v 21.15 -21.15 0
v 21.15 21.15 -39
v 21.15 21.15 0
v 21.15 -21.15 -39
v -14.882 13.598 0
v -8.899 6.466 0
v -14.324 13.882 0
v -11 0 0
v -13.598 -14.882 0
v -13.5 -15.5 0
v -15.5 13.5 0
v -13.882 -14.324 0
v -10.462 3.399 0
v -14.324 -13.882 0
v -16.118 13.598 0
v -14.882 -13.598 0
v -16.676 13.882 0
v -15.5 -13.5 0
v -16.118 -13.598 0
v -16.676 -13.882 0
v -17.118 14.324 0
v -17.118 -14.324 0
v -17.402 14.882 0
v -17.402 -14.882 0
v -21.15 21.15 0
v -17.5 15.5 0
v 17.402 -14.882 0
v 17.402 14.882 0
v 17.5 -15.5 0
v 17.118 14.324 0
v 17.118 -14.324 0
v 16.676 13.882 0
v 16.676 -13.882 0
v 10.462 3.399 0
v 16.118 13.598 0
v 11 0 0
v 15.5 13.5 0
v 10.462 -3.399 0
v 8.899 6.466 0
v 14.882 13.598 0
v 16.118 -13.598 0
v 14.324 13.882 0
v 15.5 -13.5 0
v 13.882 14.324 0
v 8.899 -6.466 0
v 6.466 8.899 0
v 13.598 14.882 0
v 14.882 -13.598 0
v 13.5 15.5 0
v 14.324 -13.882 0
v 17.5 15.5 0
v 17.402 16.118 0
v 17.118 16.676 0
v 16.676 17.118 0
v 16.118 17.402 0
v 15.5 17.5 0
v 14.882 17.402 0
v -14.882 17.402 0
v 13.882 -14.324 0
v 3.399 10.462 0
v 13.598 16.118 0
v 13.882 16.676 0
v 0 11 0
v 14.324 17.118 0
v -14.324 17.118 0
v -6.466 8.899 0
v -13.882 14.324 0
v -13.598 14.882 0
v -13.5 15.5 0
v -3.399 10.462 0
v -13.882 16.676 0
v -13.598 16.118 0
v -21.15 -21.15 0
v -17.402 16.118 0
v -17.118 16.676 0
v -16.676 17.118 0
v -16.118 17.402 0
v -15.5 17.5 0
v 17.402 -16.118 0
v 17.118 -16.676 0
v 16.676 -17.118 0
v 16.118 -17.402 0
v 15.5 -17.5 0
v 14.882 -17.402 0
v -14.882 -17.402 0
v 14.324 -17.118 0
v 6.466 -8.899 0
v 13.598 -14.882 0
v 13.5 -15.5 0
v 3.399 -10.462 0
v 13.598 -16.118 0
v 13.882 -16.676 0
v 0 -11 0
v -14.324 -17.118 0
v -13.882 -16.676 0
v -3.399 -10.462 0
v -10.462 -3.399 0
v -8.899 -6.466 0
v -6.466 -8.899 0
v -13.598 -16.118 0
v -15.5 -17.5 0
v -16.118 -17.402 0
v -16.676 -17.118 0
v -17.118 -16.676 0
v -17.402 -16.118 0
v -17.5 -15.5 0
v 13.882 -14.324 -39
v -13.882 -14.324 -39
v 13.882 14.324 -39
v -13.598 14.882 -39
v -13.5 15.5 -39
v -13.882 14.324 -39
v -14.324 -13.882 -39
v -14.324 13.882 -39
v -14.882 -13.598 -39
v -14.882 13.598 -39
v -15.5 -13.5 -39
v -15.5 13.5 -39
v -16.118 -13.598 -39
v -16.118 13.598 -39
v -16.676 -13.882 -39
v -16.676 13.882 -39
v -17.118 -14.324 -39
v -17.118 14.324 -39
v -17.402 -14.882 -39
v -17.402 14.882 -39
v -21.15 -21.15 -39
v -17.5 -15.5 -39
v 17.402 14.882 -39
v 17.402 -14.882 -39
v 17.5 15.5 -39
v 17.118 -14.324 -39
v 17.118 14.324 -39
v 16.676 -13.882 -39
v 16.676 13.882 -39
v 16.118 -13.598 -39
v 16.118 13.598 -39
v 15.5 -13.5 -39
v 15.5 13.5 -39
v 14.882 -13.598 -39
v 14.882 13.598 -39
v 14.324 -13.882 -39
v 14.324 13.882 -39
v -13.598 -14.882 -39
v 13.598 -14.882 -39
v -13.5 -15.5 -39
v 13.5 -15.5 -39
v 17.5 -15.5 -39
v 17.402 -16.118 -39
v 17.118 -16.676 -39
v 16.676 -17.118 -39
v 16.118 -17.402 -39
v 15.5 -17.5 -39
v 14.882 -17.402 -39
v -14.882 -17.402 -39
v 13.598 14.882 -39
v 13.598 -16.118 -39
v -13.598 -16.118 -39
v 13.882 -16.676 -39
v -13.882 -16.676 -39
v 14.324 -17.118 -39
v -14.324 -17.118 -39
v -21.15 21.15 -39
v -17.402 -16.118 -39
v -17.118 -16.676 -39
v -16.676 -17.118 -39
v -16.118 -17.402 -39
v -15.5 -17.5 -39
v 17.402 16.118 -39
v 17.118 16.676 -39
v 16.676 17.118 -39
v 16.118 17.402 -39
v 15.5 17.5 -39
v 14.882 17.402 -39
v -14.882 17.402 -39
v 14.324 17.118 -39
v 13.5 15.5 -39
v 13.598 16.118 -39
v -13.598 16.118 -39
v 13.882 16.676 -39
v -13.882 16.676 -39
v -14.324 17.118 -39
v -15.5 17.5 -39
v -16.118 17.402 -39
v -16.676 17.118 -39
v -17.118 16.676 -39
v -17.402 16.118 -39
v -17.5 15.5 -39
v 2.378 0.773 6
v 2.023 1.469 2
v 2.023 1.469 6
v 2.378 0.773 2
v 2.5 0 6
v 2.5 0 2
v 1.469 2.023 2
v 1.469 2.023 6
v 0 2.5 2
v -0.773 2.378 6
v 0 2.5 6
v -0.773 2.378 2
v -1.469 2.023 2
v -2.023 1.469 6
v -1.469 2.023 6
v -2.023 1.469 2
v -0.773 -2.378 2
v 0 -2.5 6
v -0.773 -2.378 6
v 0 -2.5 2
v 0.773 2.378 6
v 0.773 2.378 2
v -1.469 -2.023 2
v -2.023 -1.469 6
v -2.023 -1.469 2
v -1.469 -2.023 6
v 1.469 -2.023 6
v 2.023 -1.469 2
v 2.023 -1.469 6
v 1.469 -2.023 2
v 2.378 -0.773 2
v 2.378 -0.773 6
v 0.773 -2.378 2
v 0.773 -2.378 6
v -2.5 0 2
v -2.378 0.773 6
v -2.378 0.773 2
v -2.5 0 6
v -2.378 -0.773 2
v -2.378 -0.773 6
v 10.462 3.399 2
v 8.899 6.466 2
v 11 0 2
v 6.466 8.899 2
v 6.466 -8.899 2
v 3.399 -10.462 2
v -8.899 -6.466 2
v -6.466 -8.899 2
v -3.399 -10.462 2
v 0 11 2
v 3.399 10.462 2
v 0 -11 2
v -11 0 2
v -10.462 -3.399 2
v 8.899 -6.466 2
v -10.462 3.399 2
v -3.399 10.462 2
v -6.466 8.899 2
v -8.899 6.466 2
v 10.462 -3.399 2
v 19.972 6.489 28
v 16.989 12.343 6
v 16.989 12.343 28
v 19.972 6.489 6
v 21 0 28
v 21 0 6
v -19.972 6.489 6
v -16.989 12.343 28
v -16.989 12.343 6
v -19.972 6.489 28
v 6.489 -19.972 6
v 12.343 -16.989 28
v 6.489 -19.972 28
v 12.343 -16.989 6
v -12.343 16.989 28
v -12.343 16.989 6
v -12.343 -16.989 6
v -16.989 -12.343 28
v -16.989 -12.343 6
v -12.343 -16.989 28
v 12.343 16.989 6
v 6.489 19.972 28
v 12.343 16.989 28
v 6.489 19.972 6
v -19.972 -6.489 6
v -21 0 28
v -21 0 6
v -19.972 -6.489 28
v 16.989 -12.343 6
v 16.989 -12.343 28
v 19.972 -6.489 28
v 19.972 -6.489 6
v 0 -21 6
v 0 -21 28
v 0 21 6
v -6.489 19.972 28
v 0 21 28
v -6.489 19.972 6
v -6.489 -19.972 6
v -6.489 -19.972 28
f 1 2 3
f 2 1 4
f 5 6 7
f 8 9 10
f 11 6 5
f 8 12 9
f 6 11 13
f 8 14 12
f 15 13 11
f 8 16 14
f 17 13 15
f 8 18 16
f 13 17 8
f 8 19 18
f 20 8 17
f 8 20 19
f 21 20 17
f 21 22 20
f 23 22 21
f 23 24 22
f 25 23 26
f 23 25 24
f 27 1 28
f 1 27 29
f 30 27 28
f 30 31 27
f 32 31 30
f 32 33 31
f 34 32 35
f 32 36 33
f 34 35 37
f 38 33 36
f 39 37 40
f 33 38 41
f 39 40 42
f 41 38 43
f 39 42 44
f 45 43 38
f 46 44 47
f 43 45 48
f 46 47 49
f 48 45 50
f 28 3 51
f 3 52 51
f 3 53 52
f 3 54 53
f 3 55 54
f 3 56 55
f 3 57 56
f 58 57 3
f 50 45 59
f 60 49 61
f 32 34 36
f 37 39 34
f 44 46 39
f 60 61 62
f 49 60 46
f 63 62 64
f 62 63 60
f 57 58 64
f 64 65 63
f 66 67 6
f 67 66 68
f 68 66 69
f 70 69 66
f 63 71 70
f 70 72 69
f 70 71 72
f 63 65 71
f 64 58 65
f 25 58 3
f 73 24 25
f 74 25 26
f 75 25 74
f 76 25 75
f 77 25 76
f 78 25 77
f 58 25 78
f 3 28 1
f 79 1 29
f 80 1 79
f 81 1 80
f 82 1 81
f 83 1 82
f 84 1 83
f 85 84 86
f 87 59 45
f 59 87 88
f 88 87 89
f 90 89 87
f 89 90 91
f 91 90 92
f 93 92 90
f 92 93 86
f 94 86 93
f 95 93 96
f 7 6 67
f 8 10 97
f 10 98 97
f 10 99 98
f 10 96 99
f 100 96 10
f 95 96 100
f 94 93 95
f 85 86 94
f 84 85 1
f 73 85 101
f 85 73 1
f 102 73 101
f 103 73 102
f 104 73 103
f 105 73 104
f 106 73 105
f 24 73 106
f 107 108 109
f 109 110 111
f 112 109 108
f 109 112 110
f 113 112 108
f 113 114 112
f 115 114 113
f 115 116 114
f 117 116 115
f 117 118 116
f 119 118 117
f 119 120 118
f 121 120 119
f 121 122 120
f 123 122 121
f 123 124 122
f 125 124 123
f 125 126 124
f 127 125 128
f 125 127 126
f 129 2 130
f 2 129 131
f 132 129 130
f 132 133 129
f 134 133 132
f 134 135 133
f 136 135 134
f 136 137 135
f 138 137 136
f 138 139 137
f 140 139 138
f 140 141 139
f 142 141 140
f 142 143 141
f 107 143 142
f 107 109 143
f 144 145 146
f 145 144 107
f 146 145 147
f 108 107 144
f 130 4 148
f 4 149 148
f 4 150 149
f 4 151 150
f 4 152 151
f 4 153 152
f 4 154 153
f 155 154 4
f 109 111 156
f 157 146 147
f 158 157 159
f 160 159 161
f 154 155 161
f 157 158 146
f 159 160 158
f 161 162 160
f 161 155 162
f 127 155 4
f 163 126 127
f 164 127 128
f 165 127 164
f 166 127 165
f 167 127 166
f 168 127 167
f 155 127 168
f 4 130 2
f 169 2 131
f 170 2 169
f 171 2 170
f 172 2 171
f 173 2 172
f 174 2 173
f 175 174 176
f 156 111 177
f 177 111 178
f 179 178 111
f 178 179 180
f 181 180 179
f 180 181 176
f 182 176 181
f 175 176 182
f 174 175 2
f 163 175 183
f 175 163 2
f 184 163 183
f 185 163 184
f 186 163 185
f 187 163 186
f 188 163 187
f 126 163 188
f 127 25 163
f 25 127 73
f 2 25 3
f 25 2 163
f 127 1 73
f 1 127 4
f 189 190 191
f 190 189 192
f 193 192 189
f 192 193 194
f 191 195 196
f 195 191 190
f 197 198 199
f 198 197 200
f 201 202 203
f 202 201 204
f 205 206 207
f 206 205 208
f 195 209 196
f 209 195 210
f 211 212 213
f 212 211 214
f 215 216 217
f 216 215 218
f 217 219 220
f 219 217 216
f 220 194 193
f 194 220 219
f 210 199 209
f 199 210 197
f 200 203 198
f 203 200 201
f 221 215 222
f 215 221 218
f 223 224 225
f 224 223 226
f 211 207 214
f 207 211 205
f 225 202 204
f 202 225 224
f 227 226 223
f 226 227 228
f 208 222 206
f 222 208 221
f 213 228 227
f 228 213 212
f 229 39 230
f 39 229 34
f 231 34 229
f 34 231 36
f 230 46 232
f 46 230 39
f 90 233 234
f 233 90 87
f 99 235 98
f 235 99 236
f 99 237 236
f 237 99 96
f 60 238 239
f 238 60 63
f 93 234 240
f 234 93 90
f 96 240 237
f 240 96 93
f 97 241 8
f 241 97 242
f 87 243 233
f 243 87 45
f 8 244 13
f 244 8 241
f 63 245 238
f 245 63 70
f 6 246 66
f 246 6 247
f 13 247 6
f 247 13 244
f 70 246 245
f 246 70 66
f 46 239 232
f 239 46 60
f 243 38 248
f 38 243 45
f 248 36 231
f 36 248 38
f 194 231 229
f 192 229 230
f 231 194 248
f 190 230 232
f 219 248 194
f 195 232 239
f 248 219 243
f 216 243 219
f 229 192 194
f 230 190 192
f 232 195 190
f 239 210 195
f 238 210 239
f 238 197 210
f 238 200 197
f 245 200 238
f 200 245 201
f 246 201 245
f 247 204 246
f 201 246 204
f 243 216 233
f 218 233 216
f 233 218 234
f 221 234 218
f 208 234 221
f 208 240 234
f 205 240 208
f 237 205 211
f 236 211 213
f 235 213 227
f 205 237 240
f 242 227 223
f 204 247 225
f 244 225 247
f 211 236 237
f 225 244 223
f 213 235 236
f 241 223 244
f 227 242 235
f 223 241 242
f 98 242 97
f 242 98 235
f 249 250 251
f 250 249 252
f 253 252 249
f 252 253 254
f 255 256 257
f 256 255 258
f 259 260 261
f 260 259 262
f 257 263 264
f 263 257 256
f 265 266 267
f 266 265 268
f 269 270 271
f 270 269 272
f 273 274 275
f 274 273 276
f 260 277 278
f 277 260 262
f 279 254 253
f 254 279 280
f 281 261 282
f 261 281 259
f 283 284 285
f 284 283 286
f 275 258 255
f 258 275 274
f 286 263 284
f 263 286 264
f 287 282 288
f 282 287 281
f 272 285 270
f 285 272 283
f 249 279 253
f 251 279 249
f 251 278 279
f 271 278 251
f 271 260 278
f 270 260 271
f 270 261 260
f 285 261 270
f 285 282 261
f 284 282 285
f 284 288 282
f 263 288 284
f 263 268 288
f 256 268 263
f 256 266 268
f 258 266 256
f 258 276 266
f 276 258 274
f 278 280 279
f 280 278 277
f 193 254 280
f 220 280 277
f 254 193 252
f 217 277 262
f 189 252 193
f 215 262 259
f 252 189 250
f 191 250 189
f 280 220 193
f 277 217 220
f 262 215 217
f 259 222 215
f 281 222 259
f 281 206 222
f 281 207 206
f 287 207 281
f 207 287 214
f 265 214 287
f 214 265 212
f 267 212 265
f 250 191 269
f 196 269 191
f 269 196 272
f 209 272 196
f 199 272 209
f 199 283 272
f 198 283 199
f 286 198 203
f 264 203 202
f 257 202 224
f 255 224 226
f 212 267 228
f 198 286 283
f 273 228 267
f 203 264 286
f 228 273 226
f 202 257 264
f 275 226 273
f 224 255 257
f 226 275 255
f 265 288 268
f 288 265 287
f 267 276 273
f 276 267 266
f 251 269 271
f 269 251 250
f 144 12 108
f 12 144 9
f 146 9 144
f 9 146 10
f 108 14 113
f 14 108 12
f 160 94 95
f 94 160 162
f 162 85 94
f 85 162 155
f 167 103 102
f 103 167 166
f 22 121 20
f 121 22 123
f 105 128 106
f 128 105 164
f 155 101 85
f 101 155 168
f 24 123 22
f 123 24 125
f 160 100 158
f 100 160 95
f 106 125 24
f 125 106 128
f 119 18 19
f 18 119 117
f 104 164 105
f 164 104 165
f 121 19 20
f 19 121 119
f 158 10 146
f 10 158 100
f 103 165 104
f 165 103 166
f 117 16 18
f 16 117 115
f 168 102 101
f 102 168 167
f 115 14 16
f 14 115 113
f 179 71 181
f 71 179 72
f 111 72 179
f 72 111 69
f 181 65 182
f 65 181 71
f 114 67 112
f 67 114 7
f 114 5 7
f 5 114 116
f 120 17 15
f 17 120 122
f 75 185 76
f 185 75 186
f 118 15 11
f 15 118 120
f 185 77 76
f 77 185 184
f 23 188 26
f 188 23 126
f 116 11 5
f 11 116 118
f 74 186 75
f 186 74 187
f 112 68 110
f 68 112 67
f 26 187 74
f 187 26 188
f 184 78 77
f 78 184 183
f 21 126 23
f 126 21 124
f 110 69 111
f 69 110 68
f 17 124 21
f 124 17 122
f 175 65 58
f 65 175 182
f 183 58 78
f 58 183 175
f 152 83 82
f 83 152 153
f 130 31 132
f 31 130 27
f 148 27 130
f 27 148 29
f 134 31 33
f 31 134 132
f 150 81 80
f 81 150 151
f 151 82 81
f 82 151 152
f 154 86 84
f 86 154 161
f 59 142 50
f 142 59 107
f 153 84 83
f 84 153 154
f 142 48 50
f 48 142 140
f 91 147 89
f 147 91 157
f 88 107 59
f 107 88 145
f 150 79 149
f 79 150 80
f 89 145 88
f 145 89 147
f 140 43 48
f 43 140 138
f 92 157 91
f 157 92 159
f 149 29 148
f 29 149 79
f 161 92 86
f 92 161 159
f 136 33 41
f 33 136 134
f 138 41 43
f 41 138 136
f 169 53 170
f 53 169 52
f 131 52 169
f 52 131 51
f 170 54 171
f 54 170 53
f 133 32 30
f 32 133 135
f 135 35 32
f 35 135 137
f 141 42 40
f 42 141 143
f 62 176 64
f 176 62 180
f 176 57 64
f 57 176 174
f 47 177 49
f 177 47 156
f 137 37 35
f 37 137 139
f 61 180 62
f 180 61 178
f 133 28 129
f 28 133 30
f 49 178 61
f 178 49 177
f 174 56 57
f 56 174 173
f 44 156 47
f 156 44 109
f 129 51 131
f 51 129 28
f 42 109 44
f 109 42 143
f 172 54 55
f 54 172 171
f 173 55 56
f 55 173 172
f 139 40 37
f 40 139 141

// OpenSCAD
breedte=42.3;
lengte=breedte;
diepte=39;
afstandTussenGaten=31;
halveBreedte=breedte/2;
halveLengte=lengte/2;
diameterMiddenring=22;
dikteMiddenring=2;
asLengte=22;
asDiameter=5;
schroefgatDiameter=4;
halveAfstandTussenGaten=afstandTussenGaten/2;
diameterKettingwiel=42;
dikteKettingwiel=22;
ruimteTussenMotorEnKettingwiel=6;
translate([-breedte/2,-lengte/2,-diepte]){
    difference(){
        union(){
            translate([0,0,0]){
               cube([breedte,lengte,diepte], center=false);
            }
            translate([halveBreedte,halveLengte,0]){
                rotate([0,0,0]){
                    cylinder(h=diepte+dikteMiddenring+asLengte, r=asDiameter/2, $fn=20, center=false);
                }
            }
            translate([halveBreedte,halveLengte,0]){
                rotate([0,0,0]){
                    cylinder(h=diepte+dikteMiddenring, r=diameterMiddenring/2, $fn=20, center=false);
                }
            }

            translate([halveBreedte,halveLengte,diepte+ruimteTussenMotorEnKettingwiel]){
                rotate([0,0,0]){
                    cylinder(h=dikteKettingwiel, r=diameterKettingwiel/2, $fn=20, center=false);
                }
            }


     
        }
        union() {

            translate([halveBreedte-halveAfstandTussenGaten,halveLengte-halveAfstandTussenGaten,0]){
                rotate([0,0,0]){
                    cylinder(h=diepte+1, r=schroefgatDiameter/2, $fn=20, center=false);
                }
            }
            translate([halveBreedte-halveAfstandTussenGaten,halveLengte+halveAfstandTussenGaten,0]){
                rotate([0,0,0]){
                    cylinder(h=diepte+1, r=schroefgatDiameter/2, $fn=20, center=false);
                }
            }
            translate([halveBreedte+halveAfstandTussenGaten,halveLengte-halveAfstandTussenGaten,0]){
                rotate([0,0,0]){
                    cylinder(h=diepte+1, r=schroefgatDiameter/2, $fn=20, center=false);
                }
            }
            translate([halveBreedte+halveAfstandTussenGaten,halveLengte+halveAfstandTussenGaten,0]){
                rotate([0,0,0]){
                    cylinder(h=diepte+1, r=schroefgatDiameter/2, $fn=20, center=false);
                }
            }
        }
    }
}
